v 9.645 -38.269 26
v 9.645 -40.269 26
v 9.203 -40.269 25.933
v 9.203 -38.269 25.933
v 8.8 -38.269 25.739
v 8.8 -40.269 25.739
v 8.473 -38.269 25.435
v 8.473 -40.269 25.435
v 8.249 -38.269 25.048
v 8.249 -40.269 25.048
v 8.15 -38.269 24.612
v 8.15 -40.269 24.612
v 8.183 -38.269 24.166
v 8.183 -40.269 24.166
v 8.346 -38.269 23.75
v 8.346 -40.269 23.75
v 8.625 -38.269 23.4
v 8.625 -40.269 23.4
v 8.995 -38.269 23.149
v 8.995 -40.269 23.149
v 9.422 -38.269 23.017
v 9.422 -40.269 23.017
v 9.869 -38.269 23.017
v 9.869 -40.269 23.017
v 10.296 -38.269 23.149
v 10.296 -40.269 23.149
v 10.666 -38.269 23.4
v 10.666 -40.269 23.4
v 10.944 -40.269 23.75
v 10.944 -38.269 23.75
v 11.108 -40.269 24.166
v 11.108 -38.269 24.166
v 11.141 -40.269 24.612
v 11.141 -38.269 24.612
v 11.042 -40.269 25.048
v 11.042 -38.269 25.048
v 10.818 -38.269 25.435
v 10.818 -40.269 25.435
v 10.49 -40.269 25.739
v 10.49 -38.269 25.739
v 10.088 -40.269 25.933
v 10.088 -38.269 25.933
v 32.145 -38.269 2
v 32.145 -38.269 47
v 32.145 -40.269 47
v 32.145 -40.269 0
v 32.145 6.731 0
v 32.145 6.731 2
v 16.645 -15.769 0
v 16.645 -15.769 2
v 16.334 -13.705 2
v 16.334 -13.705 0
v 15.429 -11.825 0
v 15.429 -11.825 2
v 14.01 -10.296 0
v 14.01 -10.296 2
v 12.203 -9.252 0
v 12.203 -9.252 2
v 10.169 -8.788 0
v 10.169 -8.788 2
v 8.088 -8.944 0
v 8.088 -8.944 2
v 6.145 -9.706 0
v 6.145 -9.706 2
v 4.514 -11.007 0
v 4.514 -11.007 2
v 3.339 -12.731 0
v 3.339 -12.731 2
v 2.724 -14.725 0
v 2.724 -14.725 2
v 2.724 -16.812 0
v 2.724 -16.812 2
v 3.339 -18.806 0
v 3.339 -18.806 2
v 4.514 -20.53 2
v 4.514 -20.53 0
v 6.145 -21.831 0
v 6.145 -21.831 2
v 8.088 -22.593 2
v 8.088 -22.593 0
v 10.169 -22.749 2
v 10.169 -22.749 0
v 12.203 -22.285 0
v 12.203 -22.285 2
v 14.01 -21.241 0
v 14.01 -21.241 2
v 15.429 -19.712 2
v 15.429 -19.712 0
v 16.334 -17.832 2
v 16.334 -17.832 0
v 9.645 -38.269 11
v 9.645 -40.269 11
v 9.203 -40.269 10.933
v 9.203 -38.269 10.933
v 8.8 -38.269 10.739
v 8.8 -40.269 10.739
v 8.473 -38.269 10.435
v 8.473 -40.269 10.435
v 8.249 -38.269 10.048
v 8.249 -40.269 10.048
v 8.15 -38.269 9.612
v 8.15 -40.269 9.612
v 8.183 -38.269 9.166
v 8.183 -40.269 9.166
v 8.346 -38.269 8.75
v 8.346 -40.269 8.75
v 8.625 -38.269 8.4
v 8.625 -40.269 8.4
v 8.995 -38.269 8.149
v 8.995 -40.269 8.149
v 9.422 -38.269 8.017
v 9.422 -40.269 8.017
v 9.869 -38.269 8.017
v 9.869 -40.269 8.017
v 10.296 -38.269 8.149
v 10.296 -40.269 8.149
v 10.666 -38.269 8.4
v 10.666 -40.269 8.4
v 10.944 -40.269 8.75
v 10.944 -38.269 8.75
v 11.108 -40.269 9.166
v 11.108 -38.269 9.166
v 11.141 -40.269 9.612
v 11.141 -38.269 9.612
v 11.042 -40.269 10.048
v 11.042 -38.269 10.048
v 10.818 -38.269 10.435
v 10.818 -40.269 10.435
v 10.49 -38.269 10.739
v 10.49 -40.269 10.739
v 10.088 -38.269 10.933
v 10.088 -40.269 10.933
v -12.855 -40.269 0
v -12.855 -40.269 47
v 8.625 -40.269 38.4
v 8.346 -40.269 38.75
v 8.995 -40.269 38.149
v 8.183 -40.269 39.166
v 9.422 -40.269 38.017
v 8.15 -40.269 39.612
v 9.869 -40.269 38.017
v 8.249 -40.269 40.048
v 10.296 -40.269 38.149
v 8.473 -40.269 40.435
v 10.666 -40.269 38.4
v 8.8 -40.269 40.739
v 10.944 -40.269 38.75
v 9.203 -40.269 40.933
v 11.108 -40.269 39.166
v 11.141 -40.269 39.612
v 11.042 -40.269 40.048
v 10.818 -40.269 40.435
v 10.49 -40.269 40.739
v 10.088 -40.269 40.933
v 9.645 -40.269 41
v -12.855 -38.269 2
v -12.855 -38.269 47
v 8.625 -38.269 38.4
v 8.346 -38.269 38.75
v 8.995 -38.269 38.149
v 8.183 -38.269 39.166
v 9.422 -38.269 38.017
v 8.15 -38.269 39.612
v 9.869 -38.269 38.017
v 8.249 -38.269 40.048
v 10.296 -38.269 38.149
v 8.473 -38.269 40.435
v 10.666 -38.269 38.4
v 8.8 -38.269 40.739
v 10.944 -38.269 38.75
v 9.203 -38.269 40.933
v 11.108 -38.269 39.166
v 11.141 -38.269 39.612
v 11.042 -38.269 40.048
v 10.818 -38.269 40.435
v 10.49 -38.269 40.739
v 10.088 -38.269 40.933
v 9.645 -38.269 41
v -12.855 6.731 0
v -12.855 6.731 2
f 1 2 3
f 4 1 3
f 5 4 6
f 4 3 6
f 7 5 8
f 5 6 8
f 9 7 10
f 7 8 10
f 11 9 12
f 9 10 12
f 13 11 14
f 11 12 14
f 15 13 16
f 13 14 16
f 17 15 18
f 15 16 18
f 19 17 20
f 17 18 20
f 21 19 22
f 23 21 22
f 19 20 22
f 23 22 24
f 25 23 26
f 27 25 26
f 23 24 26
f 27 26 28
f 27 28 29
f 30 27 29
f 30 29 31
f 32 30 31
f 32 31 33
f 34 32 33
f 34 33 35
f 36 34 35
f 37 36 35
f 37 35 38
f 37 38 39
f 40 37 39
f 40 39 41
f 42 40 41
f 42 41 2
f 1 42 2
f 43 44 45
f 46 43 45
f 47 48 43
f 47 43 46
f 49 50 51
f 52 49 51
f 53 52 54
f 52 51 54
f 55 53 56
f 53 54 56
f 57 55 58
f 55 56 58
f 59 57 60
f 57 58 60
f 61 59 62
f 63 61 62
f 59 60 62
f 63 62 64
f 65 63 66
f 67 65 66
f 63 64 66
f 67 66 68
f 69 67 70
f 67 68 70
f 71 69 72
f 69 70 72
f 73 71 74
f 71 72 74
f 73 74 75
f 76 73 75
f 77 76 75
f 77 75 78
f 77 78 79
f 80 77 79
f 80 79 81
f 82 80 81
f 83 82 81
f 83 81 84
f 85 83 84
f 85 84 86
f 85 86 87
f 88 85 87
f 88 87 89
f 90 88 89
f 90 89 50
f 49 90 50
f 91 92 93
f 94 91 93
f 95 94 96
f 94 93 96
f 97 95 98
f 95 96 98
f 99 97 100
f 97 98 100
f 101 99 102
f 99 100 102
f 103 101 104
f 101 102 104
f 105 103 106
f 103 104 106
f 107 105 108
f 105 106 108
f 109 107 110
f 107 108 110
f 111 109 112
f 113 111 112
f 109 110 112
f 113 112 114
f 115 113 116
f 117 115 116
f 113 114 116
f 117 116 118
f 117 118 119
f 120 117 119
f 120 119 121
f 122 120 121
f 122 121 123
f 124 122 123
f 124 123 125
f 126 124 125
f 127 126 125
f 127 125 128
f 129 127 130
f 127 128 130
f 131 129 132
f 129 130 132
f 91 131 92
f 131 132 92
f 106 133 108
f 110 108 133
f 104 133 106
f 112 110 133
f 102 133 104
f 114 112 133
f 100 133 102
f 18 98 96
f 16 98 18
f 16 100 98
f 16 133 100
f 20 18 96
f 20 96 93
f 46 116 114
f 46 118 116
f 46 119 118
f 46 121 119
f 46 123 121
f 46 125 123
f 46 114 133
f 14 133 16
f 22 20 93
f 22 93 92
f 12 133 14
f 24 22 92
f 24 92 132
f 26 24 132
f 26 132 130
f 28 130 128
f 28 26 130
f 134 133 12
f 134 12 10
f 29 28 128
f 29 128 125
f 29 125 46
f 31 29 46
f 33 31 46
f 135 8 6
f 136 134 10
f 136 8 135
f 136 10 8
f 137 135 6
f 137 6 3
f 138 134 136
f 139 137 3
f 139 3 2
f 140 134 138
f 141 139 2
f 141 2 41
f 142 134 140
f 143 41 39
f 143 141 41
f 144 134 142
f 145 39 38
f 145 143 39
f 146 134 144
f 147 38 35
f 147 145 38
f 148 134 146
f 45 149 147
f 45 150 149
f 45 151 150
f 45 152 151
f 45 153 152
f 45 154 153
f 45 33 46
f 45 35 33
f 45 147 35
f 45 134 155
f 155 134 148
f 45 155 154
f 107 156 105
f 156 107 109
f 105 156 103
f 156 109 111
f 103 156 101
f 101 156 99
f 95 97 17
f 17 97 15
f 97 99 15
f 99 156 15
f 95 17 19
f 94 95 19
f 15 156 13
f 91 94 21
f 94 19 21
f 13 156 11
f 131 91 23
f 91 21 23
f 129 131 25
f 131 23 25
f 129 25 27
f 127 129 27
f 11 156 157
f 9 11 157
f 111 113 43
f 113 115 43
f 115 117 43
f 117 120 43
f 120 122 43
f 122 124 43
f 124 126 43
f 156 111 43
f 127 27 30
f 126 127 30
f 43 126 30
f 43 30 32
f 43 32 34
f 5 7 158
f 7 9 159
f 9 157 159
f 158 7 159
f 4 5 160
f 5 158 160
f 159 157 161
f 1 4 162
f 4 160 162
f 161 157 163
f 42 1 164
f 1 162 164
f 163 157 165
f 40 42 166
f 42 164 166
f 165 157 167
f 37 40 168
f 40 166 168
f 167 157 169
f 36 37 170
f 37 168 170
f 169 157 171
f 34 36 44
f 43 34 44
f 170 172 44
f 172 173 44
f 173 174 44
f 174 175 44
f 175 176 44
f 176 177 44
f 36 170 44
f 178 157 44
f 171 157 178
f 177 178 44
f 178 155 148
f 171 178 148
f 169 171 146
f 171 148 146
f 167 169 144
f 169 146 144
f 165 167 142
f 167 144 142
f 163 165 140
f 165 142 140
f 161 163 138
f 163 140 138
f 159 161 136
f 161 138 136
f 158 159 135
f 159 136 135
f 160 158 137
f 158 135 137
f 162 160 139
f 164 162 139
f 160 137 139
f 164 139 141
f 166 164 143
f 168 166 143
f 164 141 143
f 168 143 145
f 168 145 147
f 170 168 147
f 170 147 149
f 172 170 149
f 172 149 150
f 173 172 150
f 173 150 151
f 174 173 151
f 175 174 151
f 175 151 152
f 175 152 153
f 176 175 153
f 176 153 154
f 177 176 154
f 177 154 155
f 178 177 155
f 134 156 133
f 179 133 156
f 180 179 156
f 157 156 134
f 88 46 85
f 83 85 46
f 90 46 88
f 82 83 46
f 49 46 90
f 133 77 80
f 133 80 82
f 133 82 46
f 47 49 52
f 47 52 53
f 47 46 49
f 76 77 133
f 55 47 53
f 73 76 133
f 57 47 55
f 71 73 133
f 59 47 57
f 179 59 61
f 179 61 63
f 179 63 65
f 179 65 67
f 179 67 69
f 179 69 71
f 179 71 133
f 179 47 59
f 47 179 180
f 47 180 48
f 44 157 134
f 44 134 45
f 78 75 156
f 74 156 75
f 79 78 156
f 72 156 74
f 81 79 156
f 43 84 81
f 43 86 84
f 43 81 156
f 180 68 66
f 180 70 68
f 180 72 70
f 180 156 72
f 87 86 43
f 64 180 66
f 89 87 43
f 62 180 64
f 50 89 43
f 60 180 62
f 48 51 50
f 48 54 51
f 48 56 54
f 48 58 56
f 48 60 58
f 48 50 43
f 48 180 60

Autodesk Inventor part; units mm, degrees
ref_plane "YZ Plane" through (0, 0, 0) normal (1, 0, 0) x (0, 1, 0)
ref_plane "XZ Plane" through (0, 0, 0) normal (0, 1, 0) x (-1, 0, 0)
ref_plane "XY Plane" through (0, 0, 0) normal (0, 0, 1) x (1, 0, 0)
sketch "スケッチ1" plane through (0, 0, 0) normal (0, 0, 1) x (1, 0, 0)
  line L0 (-12.8546, 6.7314) -> (32.1454, 6.7314)
  line L1 (32.1454, 6.7314) -> (32.1454, -38.2686)
  line L2 (32.1454, -38.2686) -> (-12.8546, -38.2686)
  line L3 (-12.8546, -38.2686) -> (-12.8546, 6.7314)
  point P0 (0, 0)
  dimension "d0" = 45
  dimension "d1" = 45
sketch "スケッチ2" plane through (0, 0, 0) normal (0, 0, 1) x (1, 0, 0)
  point P0 (0, 0)
extrude "押し出し1" add sketch "スケッチ1" along normal blind 2
sketch "スケッチ3" plane through (0, 0, 2) normal (0, 0, 1) x (1, 0, 0)
  circle A0 centre (9.6454, -15.7686) radius 4
  line L0 (-12.8546, 6.7314) -> (-12.8546, -38.2686) projected
  line L1 (32.1454, 6.7314) -> (-12.8546, 6.7314) projected
  point P0 (0, 0)
  dimension "d4" = 8
  dimension "d5" = 22.5
  dimension "d6" = 45
  dimension "d7" = 22.5
hole "穴1" at (9.6454, -15.7686, 2) direction (0, 0, -1) diameter 8 depth 2
sketch "スケッチ4" plane through (-12.8546, -38.2686, 0) normal (0, -1, 0) x (1, 0, 0)
  line L0 (0, 47) -> (45, 47)
  line L1 (45, 47) -> (45, 0)
  line L2 (45, 0) -> (0, 0)
  line L3 (0, 0) -> (0, 47)
  point P0 (12.8546, 0)
  dimension "d15" = 45
  dimension "d16" = 47
extrude "押し出し2" add sketch "スケッチ4" along normal blind 2
sketch "スケッチ5" plane through (0, 0, 2) normal (0, 0, 1) x (1, 0, 0)
  circle A0 centre (9.6454, -15.7686) radius 7
  line L0 (32.1454, 6.7314) -> (-12.8546, 6.7314) projected
  line L1 (32.1454, -38.2686) -> (32.1454, 6.7314) projected
  point P0 (0, 0)
  dimension "d19" = 14
  dimension "d20" = 22.5
  dimension "d21" = 22.5
extrude "押し出し3" cut sketch "スケッチ5" against normal blind 2
sketch "スケッチ6" plane through (-12.8546, -38.2686, 0) normal (0, 1, 0) x (1, 0, 0)
  circle A0 centre (22.5, -9.5) radius 1.5
  circle A1 centre (22.5, -24.5) radius 1.5
  circle A2 centre (22.5, -39.5) radius 1.5
  line L0 (45, -47) -> (45, -2) projected
  line L1 (0, -47) -> (45, -47) projected
  point P0 (12.8546, 0)
  dimension "d24" = 3
  dimension "d25" = 3
  dimension "d26" = 3
  dimension "d27" = 22.5
  dimension "d28" = 22.5
  dimension "d29" = 22.5
  dimension "d30" = 7.5
  dimension "d31" = 15
  dimension "d32" = 15
hole "穴2" at (9.6454, -38.2686, 39.5) at (9.6454, -38.2686, 24.5) at (9.6454, -38.2686, 9.5) direction (0, -1, 0) diameter 3 depth 2
equation "\"BendRadius\" = Thickness"
equation "\"BendReliefWidth\" = Thickness"
equation "\"BendReliefDepth\" = 0.5 * Thickness"
equation "\"CornerReliefSize\" = 4 * Thickness"
equation "\"MinimumRemnant\" = 2 * Thickness"
equation "\"TransitionRadius\" = BendRadius"
equation "\"JacobiRadiusSize\" = BendRadius"
equation "\"GapSize\" = Thickness"
equation "\"Thickness\" = 0.5"
properties part number "nhk14" material "アルミニウム 6061"
